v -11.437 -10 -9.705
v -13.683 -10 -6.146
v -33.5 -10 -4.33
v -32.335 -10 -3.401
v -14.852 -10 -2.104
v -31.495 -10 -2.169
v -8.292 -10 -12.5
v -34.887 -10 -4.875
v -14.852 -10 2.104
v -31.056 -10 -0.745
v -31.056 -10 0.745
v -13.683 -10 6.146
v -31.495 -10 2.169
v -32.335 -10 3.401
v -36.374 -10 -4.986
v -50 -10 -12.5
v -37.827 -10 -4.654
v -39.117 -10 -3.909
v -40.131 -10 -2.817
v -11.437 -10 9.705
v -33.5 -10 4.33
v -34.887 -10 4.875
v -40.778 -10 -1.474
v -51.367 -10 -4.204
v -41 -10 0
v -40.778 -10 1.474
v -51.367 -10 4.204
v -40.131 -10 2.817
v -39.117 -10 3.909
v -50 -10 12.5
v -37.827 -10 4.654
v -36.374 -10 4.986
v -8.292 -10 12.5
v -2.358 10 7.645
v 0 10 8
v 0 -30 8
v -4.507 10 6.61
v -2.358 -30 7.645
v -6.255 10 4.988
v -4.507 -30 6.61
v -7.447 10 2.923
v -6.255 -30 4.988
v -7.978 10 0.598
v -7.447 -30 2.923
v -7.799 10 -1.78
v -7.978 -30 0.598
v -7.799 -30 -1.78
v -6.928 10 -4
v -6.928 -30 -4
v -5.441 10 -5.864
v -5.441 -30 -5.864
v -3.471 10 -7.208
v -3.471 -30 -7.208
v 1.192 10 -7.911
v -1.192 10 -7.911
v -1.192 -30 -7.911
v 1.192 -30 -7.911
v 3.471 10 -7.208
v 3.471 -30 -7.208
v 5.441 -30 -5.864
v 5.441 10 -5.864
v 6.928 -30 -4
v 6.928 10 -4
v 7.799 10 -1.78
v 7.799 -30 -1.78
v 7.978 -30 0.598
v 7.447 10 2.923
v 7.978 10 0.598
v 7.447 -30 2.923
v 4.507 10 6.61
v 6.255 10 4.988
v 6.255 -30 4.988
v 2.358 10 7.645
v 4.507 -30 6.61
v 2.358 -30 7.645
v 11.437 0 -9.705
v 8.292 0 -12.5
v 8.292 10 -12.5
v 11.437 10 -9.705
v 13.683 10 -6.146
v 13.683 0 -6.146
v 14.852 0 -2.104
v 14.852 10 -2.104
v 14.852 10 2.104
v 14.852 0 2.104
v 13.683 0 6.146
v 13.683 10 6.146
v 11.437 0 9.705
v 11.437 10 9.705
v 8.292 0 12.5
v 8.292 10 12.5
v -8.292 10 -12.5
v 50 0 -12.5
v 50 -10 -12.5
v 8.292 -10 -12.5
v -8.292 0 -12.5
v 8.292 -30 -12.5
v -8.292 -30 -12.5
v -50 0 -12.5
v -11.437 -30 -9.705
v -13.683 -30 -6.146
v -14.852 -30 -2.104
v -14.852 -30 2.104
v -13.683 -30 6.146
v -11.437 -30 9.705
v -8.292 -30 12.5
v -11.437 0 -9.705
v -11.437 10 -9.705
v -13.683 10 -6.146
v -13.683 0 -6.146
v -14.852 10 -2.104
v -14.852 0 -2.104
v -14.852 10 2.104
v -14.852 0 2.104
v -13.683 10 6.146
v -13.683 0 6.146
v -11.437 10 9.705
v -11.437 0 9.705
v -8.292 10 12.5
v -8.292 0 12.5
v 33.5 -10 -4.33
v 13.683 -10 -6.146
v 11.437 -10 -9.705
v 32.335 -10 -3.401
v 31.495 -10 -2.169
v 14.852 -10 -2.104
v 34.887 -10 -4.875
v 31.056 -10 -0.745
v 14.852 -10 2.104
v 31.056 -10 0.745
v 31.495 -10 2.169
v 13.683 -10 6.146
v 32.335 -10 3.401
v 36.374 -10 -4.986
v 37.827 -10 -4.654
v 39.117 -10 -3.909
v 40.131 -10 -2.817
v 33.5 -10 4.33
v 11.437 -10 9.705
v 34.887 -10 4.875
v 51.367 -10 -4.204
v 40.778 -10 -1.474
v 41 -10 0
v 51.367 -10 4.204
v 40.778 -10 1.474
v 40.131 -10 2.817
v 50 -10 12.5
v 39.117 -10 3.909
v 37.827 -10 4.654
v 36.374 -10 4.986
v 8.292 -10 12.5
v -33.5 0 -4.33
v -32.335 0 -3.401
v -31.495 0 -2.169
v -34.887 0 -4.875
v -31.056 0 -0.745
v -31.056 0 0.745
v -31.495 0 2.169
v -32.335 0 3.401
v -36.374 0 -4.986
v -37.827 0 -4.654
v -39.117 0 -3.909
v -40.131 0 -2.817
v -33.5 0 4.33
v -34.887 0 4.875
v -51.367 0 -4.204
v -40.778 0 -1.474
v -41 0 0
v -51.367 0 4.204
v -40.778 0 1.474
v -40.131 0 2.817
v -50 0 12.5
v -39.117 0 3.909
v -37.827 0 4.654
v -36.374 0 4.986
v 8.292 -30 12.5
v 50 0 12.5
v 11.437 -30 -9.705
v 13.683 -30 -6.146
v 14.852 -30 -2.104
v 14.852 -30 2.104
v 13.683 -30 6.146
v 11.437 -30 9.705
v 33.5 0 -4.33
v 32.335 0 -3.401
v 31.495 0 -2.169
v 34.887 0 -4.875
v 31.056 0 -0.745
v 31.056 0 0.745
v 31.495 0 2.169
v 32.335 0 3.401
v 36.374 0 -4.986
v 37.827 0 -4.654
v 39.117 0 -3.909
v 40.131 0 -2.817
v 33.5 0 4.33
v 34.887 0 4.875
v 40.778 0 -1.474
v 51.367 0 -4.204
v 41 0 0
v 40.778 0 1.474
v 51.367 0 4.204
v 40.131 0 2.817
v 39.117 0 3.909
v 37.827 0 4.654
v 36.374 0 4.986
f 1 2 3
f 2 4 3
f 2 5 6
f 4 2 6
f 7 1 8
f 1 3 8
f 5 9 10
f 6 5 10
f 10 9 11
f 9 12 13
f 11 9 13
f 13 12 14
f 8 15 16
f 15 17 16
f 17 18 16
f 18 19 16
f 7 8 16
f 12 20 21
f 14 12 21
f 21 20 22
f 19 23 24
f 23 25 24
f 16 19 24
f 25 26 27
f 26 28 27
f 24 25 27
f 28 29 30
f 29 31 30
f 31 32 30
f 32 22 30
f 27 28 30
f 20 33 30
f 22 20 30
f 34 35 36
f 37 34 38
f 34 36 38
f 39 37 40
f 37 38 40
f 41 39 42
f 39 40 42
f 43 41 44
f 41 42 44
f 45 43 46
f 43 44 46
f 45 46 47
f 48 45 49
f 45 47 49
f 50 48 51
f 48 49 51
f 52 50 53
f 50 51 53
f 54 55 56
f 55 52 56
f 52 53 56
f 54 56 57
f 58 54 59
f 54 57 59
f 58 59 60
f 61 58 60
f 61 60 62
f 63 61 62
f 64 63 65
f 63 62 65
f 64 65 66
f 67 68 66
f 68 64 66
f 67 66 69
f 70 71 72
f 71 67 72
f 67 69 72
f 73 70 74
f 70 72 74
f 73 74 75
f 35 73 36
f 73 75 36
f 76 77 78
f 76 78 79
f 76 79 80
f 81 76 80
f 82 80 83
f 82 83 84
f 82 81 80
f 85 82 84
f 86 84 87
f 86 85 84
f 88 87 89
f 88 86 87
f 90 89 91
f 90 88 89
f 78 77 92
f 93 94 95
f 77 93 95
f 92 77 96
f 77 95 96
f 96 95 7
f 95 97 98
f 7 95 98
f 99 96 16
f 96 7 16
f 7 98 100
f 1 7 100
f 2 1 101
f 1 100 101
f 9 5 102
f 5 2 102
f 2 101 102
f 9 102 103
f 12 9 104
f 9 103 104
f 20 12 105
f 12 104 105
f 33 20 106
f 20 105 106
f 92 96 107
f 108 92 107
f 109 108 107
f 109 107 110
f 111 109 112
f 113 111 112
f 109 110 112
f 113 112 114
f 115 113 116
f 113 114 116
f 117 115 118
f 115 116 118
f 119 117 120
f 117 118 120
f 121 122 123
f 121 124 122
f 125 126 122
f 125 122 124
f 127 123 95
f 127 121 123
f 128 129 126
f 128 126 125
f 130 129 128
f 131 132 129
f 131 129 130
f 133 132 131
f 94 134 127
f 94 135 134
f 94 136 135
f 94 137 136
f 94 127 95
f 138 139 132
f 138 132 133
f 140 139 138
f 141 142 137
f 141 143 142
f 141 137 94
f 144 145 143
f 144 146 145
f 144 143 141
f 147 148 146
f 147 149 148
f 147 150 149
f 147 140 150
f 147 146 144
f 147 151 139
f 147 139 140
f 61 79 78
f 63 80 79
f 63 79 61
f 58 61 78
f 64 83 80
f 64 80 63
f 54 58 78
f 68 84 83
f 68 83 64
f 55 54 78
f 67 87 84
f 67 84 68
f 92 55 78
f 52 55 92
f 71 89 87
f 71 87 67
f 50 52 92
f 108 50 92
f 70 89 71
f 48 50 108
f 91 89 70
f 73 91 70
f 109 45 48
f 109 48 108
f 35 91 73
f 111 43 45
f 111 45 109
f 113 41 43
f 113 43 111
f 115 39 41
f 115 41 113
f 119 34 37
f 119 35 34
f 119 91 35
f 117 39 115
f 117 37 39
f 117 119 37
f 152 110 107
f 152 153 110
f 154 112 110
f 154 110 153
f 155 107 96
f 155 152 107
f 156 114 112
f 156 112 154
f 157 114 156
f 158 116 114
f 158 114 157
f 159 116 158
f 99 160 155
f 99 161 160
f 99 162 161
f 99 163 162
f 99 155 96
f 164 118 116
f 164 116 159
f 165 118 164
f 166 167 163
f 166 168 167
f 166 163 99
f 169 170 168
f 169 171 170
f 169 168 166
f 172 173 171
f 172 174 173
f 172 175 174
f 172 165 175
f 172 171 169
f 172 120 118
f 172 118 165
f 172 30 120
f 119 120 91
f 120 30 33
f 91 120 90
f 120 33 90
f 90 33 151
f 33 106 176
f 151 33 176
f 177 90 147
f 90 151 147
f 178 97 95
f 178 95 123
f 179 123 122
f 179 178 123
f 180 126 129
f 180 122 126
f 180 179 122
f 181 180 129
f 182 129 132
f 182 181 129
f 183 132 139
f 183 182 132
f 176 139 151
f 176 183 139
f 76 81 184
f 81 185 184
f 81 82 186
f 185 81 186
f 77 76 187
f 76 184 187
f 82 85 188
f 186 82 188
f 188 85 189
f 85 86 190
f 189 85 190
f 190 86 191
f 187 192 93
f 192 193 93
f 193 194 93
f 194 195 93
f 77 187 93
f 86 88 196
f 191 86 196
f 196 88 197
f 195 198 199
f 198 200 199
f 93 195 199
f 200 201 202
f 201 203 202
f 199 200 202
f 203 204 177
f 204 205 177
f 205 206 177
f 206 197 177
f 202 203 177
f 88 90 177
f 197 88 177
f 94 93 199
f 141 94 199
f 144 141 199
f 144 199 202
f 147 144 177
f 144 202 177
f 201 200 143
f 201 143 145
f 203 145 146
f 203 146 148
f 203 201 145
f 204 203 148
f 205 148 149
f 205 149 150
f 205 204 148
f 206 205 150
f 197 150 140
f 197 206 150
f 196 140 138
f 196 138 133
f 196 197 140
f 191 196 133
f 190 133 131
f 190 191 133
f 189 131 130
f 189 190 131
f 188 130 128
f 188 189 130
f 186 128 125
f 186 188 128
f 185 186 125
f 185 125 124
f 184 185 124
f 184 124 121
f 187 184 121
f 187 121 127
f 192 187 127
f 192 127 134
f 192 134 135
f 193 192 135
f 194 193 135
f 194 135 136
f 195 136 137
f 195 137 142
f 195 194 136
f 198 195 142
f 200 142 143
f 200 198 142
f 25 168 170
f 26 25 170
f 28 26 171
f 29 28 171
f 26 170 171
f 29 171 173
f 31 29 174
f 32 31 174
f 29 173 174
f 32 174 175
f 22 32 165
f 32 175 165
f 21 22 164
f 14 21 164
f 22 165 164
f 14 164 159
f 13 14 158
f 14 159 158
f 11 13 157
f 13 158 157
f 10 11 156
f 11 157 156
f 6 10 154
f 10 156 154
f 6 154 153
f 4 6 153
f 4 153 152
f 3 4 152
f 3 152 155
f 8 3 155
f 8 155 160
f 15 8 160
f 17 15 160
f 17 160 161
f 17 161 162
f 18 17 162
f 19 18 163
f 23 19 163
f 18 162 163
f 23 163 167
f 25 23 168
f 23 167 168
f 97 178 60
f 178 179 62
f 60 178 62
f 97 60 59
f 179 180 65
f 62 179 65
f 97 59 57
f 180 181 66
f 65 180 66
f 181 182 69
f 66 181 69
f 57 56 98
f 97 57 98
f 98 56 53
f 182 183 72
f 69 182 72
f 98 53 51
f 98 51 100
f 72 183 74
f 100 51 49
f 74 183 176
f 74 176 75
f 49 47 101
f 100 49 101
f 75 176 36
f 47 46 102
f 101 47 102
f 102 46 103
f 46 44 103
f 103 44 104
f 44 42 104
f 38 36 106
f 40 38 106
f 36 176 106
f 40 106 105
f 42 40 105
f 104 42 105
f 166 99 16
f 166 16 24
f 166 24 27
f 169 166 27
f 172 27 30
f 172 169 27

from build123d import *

# Parameters (mm, degrees)
F1_DEPTH      = 30
F1_DEPTH_BACK = 10
F0_R          = 5
F2_DEPTH      = 10


with BuildPart() as f1:
    # F0 (on Front) → F1 (new body, two sides)
    with BuildSketch(Plane.XZ) as f1_sk:
        with BuildLine():
            ThreePointArc((0, 8), (8, 0), (0, -8))
            Line((0, -8), (0, -12.5))
            Line((0, -12.5), (8.291562, -12.5))
            ThreePointArc((8.291562, -12.5), (15, 0), (8.291562, 12.5))
            Line((8.291562, 12.5), (0, 12.5))
            Line((0, 12.5), (0, 8))
        make_face()
    extrude(amount=F1_DEPTH)
    extrude(f1_sk.sketch, amount=-F1_DEPTH_BACK)

    # F0 (on Front) → F2 (join)
    with BuildSketch(Plane.XZ):
        with BuildLine():
            ThreePointArc((8.291562, 12.5), (15, 0), (8.291562, -12.5))
            Line((8.291562, -12.5), (50, -12.5))
            ThreePointArc((50, -12.5), (51.53882, 0), (50, 12.5))
            Line((50, 12.5), (8.291562, 12.5))
        make_face()
        with Locations((36, 0)):
            Circle(F0_R, mode=Mode.SUBTRACT)
    extrude(amount=F2_DEPTH)

    # F3: F1 across plane


with BuildPart() as f1_1:
    add(f1.part)
    add(f1.part.mirror(Plane.YZ))


solid = f1_1.part
